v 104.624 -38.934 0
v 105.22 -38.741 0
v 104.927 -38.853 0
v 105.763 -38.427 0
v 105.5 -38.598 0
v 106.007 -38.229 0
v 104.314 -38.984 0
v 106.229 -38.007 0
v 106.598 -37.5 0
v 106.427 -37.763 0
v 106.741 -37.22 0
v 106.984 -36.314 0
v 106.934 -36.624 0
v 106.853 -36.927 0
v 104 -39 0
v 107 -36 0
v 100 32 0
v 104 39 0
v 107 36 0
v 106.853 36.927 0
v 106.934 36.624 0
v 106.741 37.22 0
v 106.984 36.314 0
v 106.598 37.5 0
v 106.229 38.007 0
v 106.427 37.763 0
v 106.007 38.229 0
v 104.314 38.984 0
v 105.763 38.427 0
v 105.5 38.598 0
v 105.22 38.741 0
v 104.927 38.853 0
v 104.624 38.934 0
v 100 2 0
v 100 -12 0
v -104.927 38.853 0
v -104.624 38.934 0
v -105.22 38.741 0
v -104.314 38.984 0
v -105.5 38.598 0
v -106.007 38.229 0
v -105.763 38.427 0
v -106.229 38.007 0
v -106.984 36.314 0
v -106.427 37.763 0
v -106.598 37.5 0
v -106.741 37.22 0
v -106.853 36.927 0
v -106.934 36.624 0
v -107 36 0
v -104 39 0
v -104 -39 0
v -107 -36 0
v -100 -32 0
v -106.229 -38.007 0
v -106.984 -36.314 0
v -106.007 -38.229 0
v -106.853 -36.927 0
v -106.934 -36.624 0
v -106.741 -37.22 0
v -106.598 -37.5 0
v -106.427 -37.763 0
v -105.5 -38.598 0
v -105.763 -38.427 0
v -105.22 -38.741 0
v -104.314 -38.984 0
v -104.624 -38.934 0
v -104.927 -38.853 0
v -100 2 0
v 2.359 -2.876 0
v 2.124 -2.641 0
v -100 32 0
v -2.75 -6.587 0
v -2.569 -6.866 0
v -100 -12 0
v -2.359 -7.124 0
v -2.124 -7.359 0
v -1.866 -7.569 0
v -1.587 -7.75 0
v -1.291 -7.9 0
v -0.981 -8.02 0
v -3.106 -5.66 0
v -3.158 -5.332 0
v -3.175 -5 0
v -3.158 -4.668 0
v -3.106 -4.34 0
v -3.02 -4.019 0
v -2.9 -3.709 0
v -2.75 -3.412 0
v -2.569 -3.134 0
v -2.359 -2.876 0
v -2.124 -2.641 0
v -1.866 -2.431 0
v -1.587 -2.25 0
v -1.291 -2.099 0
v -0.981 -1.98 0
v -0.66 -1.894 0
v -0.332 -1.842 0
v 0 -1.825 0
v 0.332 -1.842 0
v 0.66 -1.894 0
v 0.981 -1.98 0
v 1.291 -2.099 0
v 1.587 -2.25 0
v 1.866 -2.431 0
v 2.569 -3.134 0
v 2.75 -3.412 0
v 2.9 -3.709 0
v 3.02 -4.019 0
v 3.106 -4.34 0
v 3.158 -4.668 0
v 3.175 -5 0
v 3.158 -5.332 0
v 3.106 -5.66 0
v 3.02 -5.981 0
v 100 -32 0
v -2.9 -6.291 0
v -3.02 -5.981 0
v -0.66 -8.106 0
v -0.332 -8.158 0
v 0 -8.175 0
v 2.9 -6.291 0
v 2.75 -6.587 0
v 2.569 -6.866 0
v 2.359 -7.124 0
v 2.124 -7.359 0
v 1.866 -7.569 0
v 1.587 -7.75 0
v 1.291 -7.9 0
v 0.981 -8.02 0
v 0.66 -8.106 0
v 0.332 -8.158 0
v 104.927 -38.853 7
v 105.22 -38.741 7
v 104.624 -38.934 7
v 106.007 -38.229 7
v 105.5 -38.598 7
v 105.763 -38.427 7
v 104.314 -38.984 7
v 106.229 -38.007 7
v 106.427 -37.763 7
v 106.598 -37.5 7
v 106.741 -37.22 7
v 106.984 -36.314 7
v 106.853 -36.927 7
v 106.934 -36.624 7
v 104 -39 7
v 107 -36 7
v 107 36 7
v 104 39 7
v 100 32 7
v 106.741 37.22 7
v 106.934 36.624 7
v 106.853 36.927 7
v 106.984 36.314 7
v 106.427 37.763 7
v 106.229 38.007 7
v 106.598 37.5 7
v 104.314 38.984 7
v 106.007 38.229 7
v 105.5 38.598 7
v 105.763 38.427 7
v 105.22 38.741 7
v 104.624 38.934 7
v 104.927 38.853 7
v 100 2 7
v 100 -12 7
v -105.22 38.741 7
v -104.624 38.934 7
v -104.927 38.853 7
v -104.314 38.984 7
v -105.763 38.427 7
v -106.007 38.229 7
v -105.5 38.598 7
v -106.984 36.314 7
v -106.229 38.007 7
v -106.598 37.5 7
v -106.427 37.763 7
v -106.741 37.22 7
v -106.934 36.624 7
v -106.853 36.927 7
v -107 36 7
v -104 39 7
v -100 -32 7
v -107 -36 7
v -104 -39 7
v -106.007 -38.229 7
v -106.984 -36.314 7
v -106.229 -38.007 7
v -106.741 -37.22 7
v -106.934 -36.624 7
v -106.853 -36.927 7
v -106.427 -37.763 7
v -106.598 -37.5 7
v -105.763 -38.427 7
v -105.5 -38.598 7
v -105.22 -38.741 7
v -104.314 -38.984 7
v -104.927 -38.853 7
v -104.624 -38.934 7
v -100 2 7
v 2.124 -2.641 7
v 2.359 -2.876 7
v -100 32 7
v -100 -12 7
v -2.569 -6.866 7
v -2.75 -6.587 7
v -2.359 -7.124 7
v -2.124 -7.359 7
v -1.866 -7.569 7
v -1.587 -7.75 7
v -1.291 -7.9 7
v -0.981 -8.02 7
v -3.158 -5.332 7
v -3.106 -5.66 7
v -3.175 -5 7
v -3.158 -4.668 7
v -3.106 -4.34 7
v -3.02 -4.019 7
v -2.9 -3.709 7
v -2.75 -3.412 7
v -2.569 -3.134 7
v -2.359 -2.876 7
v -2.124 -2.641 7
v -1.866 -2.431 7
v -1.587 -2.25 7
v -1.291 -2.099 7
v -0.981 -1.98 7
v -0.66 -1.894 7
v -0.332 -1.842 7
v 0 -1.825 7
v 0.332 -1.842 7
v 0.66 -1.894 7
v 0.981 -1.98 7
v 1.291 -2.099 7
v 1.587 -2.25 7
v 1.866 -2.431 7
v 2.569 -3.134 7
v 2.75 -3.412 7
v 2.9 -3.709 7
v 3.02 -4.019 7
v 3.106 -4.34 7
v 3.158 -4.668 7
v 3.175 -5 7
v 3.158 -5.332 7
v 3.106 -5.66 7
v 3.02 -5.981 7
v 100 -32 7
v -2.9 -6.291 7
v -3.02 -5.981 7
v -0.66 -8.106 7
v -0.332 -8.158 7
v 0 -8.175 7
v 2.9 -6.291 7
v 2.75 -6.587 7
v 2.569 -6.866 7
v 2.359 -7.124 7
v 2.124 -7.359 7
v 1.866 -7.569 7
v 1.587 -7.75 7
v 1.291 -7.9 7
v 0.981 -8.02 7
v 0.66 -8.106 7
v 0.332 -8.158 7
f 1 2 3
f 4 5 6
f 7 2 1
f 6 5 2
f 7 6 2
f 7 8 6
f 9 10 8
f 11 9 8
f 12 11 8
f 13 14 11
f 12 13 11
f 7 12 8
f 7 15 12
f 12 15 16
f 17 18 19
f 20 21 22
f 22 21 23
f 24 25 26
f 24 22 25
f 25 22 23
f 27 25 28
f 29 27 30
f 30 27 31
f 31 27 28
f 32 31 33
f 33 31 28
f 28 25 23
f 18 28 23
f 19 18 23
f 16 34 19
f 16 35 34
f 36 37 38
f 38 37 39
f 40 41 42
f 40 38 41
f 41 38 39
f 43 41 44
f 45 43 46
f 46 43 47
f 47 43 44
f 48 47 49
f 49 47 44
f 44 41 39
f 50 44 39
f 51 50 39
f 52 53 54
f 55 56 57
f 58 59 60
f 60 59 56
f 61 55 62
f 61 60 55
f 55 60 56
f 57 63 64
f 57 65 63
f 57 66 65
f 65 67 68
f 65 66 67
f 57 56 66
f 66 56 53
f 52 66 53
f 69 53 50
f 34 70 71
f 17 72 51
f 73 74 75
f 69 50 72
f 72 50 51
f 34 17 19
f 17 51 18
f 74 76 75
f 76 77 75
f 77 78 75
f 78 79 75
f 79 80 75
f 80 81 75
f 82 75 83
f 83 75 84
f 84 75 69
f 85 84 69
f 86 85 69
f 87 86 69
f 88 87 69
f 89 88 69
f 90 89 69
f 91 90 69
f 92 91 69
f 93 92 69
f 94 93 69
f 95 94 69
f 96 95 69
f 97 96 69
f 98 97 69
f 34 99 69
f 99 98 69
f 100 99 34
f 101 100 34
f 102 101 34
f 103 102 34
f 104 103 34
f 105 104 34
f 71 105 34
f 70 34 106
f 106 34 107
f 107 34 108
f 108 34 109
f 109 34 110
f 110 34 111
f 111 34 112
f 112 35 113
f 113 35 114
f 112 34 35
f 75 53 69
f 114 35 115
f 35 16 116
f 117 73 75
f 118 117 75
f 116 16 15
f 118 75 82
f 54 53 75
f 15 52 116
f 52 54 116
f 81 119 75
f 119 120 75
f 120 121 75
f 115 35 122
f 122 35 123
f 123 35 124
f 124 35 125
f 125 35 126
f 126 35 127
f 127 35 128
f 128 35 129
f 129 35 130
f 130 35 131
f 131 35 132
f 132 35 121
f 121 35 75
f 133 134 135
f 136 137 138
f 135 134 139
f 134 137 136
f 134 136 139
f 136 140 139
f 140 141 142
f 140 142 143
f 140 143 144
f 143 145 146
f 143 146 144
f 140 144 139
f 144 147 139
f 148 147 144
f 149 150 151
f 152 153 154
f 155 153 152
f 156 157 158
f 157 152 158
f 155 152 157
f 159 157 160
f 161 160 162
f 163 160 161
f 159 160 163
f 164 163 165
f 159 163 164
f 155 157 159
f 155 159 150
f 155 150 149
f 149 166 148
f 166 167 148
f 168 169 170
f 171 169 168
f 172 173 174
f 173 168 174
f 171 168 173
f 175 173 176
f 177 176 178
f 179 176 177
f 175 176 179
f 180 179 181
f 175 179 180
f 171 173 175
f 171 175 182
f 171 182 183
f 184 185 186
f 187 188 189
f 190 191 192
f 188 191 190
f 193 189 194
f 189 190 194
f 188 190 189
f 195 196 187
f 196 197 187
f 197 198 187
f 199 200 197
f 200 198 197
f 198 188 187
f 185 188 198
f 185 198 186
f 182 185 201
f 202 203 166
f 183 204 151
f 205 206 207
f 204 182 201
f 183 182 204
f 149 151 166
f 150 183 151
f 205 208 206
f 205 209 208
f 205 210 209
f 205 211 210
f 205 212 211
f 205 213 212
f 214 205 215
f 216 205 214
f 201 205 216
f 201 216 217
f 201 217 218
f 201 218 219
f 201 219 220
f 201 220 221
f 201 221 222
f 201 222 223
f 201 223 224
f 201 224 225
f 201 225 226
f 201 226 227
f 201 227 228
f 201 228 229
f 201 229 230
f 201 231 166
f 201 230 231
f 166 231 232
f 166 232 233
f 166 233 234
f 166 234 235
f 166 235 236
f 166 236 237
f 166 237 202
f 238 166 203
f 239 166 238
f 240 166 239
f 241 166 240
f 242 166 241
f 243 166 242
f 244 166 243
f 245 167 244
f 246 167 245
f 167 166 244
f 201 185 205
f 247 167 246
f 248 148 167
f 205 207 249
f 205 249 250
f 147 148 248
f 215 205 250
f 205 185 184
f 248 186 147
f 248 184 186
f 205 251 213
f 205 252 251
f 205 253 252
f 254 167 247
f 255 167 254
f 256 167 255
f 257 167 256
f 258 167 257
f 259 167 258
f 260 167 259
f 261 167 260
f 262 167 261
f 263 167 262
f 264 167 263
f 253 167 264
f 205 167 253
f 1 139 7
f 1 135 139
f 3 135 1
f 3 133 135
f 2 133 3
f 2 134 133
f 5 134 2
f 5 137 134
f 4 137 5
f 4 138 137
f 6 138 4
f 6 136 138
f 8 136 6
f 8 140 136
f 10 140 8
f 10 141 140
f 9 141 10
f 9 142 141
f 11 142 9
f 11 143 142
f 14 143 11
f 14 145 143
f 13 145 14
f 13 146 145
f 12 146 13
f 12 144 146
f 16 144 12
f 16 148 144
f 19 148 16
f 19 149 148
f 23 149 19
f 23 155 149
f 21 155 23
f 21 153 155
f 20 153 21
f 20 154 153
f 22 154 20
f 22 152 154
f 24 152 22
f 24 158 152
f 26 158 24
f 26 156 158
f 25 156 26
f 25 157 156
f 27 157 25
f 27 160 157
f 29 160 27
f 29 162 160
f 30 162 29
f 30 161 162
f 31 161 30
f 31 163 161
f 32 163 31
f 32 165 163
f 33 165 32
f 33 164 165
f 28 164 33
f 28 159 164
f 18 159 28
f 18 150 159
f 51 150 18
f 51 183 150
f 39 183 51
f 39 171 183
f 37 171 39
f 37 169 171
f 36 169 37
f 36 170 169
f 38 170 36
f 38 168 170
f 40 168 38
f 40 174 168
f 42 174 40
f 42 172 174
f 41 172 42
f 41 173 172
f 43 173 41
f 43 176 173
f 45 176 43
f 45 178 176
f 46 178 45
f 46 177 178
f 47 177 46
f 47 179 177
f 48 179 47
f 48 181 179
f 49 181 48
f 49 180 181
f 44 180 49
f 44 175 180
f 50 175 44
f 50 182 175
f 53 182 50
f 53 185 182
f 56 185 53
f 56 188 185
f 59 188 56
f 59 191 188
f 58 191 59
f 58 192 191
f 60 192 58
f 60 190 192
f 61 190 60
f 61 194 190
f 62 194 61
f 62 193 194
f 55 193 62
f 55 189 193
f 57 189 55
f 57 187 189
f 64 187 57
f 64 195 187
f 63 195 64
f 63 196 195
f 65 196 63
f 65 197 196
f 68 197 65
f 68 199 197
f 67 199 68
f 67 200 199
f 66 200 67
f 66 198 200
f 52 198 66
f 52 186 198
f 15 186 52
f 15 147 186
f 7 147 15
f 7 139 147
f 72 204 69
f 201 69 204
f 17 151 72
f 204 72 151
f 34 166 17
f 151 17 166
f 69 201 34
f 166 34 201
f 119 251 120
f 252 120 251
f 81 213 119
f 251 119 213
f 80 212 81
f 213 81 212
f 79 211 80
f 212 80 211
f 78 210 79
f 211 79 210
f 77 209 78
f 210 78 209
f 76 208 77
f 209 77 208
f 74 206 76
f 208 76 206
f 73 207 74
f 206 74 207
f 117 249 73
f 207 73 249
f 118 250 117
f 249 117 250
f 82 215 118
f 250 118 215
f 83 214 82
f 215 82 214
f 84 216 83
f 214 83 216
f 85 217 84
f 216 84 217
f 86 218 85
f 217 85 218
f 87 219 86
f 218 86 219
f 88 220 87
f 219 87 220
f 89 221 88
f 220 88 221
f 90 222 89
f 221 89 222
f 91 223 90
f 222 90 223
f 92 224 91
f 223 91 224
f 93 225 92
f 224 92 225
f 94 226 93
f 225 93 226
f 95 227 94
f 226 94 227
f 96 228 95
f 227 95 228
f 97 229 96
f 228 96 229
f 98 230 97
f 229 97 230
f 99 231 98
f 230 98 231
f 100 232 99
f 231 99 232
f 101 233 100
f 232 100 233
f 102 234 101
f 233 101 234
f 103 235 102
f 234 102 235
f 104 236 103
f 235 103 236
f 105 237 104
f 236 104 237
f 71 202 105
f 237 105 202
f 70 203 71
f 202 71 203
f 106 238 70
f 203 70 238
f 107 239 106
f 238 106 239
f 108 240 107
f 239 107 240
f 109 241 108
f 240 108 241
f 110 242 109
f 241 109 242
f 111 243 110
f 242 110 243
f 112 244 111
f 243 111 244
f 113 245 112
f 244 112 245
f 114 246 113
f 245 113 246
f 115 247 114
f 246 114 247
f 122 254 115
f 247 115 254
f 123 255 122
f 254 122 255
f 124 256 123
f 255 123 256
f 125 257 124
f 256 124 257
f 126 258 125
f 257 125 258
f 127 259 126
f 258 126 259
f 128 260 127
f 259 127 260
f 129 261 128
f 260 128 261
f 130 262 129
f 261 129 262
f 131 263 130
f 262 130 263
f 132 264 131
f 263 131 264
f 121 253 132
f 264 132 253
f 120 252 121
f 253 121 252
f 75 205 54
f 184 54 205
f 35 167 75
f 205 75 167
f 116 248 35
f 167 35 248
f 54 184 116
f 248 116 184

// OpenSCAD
thickness = 7; //mm
hole_diameter = 0.25 * 25.4; //mm
inside_width = 200; //mm
inside_height = 20; //mm
inside_height_larger = 30; //mm
radius=3;

$fn=60;

linear_extrude(thickness) {
  difference() {
    minkowski() {
      square(
        [2 * thickness + inside_width - 2 * radius,
         4 * thickness + inside_height + inside_height_larger - 2 * radius],
        center=true);
      circle(r=radius);
    }
    translate([0, thickness + inside_height/2]) {
      square([inside_width, inside_height_larger], center = true);
    }
    translate([0, thickness - (4 * thickness + inside_height_larger)/2]) {
      square([inside_width, inside_height], center = true);
    }
    translate([0,
               ((thickness + (inside_height-inside_height_larger)/2) + (thickness - (4 * thickness + inside_height_larger-inside_height)/2)) / 2]) {
      circle(d=hole_diameter);
    }
  }
}
